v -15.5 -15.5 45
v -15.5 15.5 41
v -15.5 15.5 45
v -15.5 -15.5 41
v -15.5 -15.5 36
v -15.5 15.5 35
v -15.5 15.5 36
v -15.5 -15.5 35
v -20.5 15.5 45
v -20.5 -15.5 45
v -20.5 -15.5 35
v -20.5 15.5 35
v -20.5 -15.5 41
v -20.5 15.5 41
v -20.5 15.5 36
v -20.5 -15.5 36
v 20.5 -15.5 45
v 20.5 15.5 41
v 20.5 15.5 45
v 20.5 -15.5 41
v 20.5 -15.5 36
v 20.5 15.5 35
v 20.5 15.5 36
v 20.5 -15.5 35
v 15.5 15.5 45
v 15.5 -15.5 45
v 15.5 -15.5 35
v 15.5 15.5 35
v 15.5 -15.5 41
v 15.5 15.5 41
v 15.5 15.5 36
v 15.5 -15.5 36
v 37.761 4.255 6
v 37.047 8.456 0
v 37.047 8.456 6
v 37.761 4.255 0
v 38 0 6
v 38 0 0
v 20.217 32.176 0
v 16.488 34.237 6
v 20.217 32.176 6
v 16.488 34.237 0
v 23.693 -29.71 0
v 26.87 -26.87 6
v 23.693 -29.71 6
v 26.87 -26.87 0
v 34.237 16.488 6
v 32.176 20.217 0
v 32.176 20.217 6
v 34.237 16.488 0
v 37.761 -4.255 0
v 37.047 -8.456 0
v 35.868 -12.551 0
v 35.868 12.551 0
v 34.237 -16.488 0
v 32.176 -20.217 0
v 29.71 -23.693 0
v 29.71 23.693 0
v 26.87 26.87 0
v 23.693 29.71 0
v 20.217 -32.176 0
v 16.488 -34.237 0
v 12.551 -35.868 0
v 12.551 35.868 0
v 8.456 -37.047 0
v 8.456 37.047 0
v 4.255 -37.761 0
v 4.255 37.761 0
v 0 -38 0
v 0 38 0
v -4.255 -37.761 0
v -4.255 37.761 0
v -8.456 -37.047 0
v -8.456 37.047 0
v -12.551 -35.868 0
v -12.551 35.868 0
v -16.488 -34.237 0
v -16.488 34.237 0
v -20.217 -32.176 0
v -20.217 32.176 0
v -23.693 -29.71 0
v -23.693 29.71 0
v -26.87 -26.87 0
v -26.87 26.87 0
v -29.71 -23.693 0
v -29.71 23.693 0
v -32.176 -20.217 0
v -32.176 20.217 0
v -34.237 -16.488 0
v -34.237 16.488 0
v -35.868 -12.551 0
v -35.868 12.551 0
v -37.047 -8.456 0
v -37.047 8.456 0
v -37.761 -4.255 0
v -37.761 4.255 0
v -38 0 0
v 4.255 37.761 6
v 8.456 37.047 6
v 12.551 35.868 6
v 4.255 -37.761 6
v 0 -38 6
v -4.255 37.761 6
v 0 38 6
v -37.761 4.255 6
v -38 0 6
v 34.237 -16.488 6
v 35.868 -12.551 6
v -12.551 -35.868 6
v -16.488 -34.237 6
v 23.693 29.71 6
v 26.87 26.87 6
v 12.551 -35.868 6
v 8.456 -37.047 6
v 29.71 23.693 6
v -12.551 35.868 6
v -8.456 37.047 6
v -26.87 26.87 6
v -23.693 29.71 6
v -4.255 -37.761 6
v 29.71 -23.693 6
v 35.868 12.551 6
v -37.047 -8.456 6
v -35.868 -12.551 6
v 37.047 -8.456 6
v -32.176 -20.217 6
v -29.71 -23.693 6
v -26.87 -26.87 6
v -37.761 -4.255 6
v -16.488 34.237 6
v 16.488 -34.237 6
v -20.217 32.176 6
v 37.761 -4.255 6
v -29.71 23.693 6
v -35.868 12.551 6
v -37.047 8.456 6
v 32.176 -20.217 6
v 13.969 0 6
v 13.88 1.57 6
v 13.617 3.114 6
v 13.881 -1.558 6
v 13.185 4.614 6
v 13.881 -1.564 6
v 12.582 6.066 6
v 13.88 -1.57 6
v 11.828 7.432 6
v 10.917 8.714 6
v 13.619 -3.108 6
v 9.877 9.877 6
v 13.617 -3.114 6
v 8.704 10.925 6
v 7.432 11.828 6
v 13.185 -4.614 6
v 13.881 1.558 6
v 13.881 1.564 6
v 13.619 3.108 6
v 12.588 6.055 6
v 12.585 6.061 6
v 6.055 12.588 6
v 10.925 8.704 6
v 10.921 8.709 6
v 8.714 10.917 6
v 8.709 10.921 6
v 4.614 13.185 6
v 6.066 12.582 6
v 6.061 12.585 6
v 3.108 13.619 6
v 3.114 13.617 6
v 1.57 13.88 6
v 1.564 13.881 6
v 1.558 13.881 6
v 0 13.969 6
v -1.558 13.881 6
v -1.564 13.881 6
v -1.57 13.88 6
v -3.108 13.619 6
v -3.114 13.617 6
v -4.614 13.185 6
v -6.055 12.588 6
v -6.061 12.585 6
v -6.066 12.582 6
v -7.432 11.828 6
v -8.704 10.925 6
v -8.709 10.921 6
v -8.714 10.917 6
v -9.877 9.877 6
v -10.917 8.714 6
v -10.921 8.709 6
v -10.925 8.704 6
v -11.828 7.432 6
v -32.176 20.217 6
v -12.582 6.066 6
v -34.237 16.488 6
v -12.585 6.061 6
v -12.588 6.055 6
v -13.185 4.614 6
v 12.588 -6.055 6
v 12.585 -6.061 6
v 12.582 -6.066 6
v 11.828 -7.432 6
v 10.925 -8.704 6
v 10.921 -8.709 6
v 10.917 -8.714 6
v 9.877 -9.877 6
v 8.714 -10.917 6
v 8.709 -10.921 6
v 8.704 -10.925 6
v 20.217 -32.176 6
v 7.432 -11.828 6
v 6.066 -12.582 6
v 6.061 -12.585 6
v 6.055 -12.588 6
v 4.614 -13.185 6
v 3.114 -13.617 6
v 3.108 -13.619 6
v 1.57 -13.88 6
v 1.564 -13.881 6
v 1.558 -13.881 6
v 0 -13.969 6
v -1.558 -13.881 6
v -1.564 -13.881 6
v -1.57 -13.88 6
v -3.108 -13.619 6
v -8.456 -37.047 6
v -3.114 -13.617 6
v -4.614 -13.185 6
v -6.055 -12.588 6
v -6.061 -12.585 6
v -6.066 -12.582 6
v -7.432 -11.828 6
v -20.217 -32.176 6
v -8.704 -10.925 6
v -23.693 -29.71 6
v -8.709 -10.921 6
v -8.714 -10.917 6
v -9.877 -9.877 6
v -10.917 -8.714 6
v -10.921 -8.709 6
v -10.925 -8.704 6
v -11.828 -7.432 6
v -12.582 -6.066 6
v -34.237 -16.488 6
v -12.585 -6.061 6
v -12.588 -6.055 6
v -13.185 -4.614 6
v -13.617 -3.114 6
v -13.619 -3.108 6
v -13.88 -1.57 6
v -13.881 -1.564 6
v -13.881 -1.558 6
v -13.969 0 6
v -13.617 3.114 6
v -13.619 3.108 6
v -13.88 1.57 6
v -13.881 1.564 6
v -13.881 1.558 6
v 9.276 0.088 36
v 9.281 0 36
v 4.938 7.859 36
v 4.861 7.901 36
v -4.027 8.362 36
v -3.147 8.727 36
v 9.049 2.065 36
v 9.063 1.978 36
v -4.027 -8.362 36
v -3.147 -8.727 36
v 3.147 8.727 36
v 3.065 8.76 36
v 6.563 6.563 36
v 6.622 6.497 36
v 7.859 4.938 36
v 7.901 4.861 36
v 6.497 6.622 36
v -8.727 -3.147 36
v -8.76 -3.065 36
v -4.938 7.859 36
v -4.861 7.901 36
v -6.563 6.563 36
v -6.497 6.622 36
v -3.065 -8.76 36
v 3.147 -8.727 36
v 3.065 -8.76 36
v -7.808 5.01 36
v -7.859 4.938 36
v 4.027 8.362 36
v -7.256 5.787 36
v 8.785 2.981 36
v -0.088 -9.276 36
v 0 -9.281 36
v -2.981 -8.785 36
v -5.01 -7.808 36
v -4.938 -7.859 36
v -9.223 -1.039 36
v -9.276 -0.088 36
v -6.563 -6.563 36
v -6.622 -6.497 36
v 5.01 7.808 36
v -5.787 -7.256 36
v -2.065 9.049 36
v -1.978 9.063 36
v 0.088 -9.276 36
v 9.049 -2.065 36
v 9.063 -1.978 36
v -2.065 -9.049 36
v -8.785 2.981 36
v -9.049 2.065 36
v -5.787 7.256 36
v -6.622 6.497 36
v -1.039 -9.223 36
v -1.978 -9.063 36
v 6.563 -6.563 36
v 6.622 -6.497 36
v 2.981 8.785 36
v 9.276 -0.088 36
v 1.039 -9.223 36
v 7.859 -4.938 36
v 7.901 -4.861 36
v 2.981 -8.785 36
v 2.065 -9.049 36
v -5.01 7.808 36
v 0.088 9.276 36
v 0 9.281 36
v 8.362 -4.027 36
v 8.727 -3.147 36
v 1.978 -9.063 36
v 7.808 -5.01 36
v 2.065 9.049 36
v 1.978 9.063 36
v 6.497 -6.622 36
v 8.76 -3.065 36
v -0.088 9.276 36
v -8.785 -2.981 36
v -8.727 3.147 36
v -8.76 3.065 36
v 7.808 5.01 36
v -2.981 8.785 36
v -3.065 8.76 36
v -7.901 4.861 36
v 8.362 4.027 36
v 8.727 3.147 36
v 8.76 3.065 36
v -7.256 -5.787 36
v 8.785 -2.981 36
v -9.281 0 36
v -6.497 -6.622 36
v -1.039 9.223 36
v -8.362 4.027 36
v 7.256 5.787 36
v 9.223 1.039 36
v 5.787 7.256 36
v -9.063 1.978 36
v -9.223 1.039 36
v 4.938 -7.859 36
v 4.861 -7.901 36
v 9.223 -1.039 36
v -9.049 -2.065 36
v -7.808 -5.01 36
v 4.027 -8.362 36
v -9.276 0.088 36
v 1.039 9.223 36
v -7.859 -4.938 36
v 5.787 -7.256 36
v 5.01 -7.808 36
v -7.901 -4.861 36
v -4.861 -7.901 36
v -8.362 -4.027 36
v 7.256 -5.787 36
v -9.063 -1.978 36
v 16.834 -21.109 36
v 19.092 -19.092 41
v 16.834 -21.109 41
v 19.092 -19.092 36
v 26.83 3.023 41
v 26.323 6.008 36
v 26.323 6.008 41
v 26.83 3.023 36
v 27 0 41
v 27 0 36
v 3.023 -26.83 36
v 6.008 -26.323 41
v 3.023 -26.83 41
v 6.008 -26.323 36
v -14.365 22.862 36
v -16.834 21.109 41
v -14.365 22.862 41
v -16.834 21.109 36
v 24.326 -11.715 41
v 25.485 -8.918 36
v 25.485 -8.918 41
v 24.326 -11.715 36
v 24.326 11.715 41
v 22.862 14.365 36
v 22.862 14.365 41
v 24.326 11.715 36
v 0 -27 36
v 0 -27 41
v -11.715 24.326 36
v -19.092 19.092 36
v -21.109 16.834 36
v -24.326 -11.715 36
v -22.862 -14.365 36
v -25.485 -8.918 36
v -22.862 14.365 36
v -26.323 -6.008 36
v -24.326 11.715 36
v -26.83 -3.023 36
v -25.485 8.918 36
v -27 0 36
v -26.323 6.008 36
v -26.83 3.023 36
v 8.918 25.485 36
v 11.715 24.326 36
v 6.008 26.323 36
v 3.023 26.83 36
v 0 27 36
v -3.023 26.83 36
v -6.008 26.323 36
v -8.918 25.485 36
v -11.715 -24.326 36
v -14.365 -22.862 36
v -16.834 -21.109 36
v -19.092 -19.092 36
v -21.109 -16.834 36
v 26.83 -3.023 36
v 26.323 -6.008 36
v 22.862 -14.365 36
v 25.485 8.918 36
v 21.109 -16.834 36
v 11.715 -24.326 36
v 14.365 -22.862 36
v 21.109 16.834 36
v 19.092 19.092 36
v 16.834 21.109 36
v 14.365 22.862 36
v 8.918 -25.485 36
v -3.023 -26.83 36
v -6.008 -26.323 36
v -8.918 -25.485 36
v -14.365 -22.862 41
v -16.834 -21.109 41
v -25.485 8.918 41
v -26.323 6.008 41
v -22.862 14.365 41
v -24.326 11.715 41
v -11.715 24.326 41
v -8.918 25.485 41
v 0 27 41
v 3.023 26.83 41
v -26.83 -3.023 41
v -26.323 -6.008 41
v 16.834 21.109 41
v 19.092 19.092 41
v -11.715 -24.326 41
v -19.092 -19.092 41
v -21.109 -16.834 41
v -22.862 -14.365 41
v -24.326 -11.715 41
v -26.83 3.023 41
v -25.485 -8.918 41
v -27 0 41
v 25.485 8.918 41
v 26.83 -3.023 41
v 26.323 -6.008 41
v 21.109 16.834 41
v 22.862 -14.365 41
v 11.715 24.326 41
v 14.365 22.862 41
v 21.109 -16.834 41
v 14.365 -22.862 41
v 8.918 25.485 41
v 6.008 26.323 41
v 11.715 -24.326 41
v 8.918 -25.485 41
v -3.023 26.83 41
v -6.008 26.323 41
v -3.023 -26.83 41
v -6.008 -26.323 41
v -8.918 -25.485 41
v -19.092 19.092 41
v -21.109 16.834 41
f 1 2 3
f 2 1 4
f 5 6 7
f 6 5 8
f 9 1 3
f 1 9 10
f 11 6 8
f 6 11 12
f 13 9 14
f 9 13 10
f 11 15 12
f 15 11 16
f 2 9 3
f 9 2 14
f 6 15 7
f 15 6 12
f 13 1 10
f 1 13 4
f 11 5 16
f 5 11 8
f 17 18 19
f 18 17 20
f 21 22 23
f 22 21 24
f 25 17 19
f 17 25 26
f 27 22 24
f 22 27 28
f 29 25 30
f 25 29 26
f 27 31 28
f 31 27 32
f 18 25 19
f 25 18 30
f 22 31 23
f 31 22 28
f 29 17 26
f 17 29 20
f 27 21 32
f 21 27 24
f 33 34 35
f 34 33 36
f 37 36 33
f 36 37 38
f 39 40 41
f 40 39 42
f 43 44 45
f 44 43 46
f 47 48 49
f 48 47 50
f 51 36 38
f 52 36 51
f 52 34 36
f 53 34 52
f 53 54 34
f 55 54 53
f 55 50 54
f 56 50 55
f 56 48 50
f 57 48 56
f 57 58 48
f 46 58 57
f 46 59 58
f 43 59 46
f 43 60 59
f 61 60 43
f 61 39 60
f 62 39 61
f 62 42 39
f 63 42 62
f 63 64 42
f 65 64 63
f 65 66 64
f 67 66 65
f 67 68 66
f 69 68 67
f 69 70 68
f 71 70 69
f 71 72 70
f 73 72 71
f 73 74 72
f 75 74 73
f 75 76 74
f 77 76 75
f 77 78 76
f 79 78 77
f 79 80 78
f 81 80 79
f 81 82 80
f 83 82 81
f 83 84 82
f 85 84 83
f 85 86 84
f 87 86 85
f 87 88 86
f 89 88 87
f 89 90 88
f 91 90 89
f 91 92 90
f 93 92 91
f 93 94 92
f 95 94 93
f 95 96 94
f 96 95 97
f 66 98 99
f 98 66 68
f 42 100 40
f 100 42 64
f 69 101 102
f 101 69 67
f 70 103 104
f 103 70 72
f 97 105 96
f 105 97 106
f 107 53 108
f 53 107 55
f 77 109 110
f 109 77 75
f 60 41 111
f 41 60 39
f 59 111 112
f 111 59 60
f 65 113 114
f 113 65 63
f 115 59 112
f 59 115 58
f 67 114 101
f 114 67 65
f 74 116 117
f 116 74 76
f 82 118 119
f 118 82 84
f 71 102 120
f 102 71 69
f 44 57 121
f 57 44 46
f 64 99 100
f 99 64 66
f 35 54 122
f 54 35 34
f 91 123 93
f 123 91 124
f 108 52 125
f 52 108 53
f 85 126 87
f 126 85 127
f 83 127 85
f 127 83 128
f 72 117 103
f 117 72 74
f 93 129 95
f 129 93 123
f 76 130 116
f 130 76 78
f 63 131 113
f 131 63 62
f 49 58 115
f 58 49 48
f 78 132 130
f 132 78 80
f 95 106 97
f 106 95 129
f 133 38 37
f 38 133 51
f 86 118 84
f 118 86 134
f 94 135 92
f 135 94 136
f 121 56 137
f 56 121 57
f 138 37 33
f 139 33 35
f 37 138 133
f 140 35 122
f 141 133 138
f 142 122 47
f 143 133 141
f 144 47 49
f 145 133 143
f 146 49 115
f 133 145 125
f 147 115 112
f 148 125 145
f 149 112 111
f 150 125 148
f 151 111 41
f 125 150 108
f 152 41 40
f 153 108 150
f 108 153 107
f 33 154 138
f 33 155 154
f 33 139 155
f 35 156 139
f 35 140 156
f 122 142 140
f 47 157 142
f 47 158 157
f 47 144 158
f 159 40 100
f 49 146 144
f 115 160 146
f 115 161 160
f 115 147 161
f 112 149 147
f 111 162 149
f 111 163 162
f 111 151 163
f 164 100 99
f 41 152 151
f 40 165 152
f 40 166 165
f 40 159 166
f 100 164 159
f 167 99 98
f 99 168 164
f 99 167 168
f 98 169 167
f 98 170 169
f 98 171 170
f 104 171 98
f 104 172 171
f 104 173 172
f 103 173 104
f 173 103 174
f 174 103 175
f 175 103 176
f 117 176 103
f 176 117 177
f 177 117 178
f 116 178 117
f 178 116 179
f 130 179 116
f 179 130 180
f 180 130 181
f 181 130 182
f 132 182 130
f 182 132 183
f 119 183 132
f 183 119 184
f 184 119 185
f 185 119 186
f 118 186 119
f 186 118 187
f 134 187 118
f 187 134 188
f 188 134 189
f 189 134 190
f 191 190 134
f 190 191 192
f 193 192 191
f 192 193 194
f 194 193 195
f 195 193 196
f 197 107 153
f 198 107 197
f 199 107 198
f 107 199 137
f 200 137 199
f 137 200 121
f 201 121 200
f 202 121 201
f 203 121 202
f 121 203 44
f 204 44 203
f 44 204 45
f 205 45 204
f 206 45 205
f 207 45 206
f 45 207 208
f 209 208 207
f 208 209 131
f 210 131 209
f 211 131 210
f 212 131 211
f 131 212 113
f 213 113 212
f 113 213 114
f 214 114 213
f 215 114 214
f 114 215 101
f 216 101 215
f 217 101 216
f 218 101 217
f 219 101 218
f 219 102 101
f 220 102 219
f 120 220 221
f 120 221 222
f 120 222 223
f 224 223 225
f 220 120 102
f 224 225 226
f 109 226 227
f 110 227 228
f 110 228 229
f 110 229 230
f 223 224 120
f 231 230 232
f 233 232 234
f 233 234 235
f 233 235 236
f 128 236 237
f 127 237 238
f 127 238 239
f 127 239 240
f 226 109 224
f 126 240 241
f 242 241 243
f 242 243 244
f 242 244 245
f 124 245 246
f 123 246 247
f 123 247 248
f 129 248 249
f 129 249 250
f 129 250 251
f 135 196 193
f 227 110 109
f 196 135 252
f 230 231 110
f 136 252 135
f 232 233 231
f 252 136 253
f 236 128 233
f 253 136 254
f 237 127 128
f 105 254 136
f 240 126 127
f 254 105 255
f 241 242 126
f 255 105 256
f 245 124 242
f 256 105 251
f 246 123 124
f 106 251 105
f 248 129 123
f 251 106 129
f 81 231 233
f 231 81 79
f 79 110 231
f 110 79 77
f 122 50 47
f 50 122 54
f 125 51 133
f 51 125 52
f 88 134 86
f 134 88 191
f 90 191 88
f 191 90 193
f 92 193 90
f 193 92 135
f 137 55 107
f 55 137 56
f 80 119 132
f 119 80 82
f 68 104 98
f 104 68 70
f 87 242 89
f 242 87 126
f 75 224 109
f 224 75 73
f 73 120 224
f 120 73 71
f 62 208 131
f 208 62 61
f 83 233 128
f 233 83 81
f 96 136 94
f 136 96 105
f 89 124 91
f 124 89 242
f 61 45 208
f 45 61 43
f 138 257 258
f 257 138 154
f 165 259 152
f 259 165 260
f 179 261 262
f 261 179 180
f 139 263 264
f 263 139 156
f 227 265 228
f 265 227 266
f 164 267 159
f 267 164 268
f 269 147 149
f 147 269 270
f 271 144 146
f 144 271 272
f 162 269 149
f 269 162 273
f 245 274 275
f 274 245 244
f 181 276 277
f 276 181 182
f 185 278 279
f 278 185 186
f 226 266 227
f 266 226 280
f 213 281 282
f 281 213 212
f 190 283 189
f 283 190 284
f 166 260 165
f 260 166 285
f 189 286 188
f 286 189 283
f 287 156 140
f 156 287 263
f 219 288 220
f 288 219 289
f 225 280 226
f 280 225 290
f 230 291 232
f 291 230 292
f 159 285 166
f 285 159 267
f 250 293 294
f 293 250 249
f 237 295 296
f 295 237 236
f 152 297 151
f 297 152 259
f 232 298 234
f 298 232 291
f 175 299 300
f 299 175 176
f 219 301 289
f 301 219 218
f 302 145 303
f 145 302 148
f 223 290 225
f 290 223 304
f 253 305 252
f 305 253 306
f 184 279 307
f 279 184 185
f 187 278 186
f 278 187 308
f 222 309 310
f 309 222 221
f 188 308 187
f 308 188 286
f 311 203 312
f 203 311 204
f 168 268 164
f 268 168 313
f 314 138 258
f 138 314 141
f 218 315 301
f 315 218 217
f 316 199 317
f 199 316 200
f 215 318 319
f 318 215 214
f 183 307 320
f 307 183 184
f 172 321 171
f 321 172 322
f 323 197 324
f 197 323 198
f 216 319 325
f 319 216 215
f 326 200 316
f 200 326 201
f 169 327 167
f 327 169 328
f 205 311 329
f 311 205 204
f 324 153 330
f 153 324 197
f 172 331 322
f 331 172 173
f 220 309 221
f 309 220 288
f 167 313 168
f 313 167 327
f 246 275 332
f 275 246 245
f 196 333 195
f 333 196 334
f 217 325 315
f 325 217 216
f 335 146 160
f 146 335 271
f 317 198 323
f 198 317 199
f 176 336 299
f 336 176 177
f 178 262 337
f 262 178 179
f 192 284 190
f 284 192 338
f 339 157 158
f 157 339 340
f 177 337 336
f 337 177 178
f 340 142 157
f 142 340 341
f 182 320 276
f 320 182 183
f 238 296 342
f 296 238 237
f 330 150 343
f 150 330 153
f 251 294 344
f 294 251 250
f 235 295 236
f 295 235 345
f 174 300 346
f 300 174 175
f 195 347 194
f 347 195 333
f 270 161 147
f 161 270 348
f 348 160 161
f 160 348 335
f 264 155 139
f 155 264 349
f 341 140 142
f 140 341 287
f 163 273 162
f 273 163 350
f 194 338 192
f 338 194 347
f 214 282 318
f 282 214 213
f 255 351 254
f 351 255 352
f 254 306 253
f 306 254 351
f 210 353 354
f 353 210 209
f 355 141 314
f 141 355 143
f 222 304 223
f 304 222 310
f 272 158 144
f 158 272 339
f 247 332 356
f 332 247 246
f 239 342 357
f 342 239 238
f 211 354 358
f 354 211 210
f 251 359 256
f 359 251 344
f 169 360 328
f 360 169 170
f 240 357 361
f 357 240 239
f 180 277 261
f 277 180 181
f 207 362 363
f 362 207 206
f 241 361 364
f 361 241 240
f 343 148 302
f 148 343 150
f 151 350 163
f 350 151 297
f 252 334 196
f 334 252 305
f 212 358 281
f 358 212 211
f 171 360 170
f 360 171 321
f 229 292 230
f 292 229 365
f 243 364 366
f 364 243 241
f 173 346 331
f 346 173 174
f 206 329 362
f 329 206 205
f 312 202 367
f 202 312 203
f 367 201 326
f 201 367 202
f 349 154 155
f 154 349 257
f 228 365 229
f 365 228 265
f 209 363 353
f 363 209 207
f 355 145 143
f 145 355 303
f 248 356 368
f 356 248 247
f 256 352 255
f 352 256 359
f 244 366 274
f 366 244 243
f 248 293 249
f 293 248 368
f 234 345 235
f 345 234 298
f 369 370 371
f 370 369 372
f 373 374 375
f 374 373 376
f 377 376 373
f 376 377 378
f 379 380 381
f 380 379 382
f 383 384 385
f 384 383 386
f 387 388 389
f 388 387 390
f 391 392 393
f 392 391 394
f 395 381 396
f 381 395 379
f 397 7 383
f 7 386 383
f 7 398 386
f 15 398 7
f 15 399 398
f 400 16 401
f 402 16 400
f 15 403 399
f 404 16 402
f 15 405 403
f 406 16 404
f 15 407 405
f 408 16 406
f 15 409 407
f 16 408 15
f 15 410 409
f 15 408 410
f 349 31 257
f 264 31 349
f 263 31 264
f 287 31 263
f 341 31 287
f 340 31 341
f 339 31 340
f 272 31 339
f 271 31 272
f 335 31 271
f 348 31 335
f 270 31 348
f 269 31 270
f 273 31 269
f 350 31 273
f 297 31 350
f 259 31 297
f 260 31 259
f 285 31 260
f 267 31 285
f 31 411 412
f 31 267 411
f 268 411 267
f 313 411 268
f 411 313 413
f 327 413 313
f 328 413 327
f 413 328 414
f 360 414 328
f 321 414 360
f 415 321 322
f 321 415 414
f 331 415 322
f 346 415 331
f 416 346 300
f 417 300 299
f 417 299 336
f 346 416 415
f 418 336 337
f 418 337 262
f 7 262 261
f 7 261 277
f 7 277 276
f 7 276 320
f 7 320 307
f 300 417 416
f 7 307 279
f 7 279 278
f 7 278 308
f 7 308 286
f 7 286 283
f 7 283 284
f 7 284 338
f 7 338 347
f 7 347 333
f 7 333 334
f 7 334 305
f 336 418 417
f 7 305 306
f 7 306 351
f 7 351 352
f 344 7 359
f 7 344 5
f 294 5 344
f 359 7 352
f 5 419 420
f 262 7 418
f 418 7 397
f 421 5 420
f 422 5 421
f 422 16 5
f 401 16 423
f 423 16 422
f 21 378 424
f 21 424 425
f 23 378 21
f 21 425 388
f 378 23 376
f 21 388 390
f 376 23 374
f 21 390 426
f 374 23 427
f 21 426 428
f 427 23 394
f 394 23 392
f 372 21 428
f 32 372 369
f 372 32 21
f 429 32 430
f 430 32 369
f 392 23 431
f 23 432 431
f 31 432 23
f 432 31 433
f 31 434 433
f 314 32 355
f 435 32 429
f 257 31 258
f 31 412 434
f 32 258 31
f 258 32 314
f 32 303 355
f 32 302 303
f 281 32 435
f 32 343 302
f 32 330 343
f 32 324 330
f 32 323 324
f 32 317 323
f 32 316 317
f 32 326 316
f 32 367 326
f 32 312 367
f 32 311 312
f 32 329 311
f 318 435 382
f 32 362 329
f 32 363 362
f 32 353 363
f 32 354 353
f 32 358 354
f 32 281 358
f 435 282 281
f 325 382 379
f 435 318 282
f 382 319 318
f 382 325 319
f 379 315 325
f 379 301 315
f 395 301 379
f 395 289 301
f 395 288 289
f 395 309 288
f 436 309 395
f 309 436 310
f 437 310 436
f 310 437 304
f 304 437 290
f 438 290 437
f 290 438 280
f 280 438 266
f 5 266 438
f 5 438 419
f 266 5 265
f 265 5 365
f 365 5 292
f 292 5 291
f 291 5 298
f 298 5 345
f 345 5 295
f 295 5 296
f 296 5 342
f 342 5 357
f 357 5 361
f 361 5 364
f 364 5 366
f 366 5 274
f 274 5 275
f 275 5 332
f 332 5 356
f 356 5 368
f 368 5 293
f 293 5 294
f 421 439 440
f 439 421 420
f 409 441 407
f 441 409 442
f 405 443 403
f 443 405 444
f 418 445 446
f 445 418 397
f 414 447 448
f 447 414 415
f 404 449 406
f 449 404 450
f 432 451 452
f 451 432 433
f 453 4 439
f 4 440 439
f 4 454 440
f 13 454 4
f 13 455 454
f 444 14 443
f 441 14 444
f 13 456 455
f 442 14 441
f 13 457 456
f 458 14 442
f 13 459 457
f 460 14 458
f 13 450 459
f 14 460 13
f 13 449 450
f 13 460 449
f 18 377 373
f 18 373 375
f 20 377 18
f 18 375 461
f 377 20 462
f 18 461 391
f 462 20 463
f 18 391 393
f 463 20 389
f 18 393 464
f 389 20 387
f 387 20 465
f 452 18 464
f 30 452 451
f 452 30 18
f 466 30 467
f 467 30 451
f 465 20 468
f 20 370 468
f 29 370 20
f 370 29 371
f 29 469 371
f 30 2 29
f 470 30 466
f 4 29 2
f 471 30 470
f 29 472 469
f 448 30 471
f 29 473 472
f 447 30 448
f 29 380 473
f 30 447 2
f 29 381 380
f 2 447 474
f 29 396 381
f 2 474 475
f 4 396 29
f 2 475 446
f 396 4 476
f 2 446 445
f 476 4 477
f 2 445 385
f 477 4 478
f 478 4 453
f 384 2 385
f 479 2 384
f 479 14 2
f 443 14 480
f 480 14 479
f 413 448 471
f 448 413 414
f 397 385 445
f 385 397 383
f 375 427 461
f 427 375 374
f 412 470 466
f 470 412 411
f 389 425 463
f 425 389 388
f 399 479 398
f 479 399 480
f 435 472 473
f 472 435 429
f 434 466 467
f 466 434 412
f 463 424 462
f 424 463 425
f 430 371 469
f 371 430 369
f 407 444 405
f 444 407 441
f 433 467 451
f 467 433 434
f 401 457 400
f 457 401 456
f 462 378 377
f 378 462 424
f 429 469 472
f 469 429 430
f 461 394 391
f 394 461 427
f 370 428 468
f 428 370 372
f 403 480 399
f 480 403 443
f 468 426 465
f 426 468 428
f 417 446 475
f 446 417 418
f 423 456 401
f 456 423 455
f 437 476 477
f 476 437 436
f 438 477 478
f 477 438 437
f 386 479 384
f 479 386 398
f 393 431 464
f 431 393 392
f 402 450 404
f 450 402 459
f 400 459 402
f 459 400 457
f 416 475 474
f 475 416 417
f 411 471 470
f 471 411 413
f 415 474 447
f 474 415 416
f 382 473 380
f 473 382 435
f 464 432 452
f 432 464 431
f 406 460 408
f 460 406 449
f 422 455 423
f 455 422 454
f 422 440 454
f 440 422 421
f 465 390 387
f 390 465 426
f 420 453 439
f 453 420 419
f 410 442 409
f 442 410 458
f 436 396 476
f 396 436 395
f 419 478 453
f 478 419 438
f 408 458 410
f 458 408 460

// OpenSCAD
// file: lib/commerce_forms.scad
// Original parametric printable prototypes. Dimensions in millimeters.
// CAD is the manufacturing authority; Three.js gallery geometry is a stylized preview.
// No external copyrighted silhouettes, brands, logos or character geometry.
$fn=56;
module market_lantern(v=1) {
  r=27+v*2; h=76+v*6; wall=2.8;
  difference() {
    cylinder(r=r,h=h);
    translate([0,0,-1]) cylinder(r=r-wall,h=h+2);
    for (tier=[0:3], j=[0:7+v]) {
      a=360*j/(8+v)+tier*15;
      rotate([0,0,a])
        translate([r-1,0,17+tier*(h-33)/3])
          rotate([0,90,0]) cylinder(r=2.2+(v%3)*.5,h=10,center=true,$fn=18);
    }
  }
}
module market_figurine(v=1) {
  r=18+v;
  union() {
    cylinder(r=29,h=6);
    translate([0,0,7]) scale([1,0.85,1.15]) sphere(r=r);
    translate([0,0,35]) scale([1,.91,.84]) sphere(r=r*.78);
    for (s=[-1,1]) {
      translate([s*(r*.58),0,49])
        rotate([0,s*13,0]) cylinder(r1=5+v*.4,r2=1,h=10+v*2);
      translate([s*(r*.73),-2,20]) scale([.36,.55,.67]) sphere(r=r*.75);
    }
    translate([0,-r*.62,39]) sphere(r=3.5+v*.2);
    for(s=[-1,1])translate([s*7,-r*.72,43])sphere(r=1.8);
  }
}
module market_scenery(v=1) {
  union() {
    translate([-52,-32,0]) cube([104,64,4]);
    for (i=[0:2+v%2]) {
      x=-40+i*24;
      translate([x, -14+(i%2)*12,3.8])
        cube([15+v*2,19,13+v*3]);
      translate([x+2,-13+(i%2)*12,16+v*3])
        cube([11+v*2,15,3]);
    }
    for(i=[-1,1]) {
      translate([i*42,20,3.8]) cylinder(r=5,h=12+v*4);
      translate([i*42,20,15+v*4]) sphere(r=6);
    }
  }
}
module market_organizer(v=1) {
  w=104+v*5;d=69+v*3;h=32+v*3; columns=2+v%3;
  difference() {
    translate([-w/2,-d/2,0]) cube([w,d,h]);
    for(i=[0:columns-1])
      translate([-w/2+3+i*(w-6)/columns,-d/2+3,4])
        cube([(w-6)/columns-3,d-6,h+3]);
  }
}
module market_display(v=1) {
  union() {
    cylinder(r=34+v*2,h=6);
    translate([0,0,5.8]) cylinder(r1=12+v,r2=9,h=26+v*3);
    translate([0,0,30+v*3]) cylinder(r=25+v,h=5);
    for(s=[-1,1])
      translate([s*(16+v),0,34+v*3])
        cube([5,31,10],center=true);
  }
}
module market_gaming(v=1) {
  w=102+v*5;d=66+v*2; h=22+v*3;
  difference() {
    union() {
      translate([-w/2,-d/2,0]) cube([w,d,h]);
      translate([-w/2, d/2-14,h-1]) cube([w,12,15+v]);
    }
    translate([-w/2+5,-d/2+5,5]) cube([w-10,d-24,h+12]);
    for(i=[-1,0,1])
      translate([i*24,d/2-13,h+6]) rotate([90,0,0])
        cylinder(r=3.6+v*.3,h=16,$fn=22);
  }
}
module market_jewelry(v=1) {
  union() {
    translate([-40,-26,0]) cube([80,52,6]);
    for (i=[0:3+v%2]) {
      x=-29+i*58/(3+v%2);
      translate([x,0,5.8]) cylinder(r=3.2,h=42+v*5,$fn=24);
      translate([x,0,46+v*5]) sphere(r=5);
    }
    translate([-33,-5,42+v*5]) cube([66,9,6]);
    for(i=[0:4])translate([-25+i*12,0,46+v*5])
      cylinder(r1=4,r2=1.5,h=7,$fn=20);
  }
}
module market_planter(v=1) {
  r=34+v*2; h=48+v*6; w=3.2;
  difference() {
    union() {
      cylinder(r=r,h=h);
      for(i=[0:9+v])
        rotate([0,0,360*i/(10+v)])
          translate([r-.5,-1.6,2]) cube([2.2,3.2,h-4]);
    }
    translate([0,0,3.8]) cylinder(r=r-w,h=h+2);
    translate([0,0,-1]) cylinder(r=2.8,h=7,$fn=24);
  }
}
module market_gift(v=1,label="CUSTOM") {
  w=100+v*6;d=49+v*3;
  difference() {
    union() {
      hull()for(x=[-w/2+7,w/2-7],y=[-d/2+7,d/2-7])
        translate([x,y,0]) cylinder(r=7,h=6,$fn=24);
      translate([0,0,5.8]) linear_extrude(height=2.2)
        text(label,size=max(9,18-v),halign="center",valign="center",
             font="Liberation Sans:style=Bold");
    }
    if(v==3)for(x=[-w/2+10,w/2-10])
      translate([x,d/2-10,-1]) cylinder(r=2.5,h=10,$fn=24);
  }
}
module market_cosplay(v=1) {
  r=28+v*2;
  difference() {
    union() {
      cylinder(r=r,h=4.5,$fn=8+v*2);
      for(i=[0:4+v])
        rotate([0,0,360*i/(5+v)])
          translate([r*.45,0,4.2]) cylinder(r=4.2,h=1.8,$fn=6);
      cylinder(r=12+v*.5,h=7,$fn=5+v);
    }
    translate([0,r*.70,-1])cylinder(r=3.3,h=10,$fn=24);
  }
}
module commercial_form(family="lantern",variant=1,label="CUSTOM") {
  if(family=="lantern")market_lantern(variant);
  else if(family=="figurine")market_figurine(variant);
  else if(family=="scenery")market_scenery(variant);
  else if(family=="organizer")market_organizer(variant);
  else if(family=="display")market_display(variant);
  else if(family=="gaming")market_gaming(variant);
  else if(family=="jewelry")market_jewelry(variant);
  else if(family=="planter")market_planter(variant);
  else if(family=="gift")market_gift(variant,label);
  else if(family=="cosplay")market_cosplay(variant);
  else assert(false,str("Unknown family: ",family));
}
// main file
// Original 3D printable CAD prototype for Watch Display Cradle
// Millimeter units; edit parameters and print-test before commercial shipment.
use <lib/commerce_forms.scad>
commercial_form(family="display",variant=2);
